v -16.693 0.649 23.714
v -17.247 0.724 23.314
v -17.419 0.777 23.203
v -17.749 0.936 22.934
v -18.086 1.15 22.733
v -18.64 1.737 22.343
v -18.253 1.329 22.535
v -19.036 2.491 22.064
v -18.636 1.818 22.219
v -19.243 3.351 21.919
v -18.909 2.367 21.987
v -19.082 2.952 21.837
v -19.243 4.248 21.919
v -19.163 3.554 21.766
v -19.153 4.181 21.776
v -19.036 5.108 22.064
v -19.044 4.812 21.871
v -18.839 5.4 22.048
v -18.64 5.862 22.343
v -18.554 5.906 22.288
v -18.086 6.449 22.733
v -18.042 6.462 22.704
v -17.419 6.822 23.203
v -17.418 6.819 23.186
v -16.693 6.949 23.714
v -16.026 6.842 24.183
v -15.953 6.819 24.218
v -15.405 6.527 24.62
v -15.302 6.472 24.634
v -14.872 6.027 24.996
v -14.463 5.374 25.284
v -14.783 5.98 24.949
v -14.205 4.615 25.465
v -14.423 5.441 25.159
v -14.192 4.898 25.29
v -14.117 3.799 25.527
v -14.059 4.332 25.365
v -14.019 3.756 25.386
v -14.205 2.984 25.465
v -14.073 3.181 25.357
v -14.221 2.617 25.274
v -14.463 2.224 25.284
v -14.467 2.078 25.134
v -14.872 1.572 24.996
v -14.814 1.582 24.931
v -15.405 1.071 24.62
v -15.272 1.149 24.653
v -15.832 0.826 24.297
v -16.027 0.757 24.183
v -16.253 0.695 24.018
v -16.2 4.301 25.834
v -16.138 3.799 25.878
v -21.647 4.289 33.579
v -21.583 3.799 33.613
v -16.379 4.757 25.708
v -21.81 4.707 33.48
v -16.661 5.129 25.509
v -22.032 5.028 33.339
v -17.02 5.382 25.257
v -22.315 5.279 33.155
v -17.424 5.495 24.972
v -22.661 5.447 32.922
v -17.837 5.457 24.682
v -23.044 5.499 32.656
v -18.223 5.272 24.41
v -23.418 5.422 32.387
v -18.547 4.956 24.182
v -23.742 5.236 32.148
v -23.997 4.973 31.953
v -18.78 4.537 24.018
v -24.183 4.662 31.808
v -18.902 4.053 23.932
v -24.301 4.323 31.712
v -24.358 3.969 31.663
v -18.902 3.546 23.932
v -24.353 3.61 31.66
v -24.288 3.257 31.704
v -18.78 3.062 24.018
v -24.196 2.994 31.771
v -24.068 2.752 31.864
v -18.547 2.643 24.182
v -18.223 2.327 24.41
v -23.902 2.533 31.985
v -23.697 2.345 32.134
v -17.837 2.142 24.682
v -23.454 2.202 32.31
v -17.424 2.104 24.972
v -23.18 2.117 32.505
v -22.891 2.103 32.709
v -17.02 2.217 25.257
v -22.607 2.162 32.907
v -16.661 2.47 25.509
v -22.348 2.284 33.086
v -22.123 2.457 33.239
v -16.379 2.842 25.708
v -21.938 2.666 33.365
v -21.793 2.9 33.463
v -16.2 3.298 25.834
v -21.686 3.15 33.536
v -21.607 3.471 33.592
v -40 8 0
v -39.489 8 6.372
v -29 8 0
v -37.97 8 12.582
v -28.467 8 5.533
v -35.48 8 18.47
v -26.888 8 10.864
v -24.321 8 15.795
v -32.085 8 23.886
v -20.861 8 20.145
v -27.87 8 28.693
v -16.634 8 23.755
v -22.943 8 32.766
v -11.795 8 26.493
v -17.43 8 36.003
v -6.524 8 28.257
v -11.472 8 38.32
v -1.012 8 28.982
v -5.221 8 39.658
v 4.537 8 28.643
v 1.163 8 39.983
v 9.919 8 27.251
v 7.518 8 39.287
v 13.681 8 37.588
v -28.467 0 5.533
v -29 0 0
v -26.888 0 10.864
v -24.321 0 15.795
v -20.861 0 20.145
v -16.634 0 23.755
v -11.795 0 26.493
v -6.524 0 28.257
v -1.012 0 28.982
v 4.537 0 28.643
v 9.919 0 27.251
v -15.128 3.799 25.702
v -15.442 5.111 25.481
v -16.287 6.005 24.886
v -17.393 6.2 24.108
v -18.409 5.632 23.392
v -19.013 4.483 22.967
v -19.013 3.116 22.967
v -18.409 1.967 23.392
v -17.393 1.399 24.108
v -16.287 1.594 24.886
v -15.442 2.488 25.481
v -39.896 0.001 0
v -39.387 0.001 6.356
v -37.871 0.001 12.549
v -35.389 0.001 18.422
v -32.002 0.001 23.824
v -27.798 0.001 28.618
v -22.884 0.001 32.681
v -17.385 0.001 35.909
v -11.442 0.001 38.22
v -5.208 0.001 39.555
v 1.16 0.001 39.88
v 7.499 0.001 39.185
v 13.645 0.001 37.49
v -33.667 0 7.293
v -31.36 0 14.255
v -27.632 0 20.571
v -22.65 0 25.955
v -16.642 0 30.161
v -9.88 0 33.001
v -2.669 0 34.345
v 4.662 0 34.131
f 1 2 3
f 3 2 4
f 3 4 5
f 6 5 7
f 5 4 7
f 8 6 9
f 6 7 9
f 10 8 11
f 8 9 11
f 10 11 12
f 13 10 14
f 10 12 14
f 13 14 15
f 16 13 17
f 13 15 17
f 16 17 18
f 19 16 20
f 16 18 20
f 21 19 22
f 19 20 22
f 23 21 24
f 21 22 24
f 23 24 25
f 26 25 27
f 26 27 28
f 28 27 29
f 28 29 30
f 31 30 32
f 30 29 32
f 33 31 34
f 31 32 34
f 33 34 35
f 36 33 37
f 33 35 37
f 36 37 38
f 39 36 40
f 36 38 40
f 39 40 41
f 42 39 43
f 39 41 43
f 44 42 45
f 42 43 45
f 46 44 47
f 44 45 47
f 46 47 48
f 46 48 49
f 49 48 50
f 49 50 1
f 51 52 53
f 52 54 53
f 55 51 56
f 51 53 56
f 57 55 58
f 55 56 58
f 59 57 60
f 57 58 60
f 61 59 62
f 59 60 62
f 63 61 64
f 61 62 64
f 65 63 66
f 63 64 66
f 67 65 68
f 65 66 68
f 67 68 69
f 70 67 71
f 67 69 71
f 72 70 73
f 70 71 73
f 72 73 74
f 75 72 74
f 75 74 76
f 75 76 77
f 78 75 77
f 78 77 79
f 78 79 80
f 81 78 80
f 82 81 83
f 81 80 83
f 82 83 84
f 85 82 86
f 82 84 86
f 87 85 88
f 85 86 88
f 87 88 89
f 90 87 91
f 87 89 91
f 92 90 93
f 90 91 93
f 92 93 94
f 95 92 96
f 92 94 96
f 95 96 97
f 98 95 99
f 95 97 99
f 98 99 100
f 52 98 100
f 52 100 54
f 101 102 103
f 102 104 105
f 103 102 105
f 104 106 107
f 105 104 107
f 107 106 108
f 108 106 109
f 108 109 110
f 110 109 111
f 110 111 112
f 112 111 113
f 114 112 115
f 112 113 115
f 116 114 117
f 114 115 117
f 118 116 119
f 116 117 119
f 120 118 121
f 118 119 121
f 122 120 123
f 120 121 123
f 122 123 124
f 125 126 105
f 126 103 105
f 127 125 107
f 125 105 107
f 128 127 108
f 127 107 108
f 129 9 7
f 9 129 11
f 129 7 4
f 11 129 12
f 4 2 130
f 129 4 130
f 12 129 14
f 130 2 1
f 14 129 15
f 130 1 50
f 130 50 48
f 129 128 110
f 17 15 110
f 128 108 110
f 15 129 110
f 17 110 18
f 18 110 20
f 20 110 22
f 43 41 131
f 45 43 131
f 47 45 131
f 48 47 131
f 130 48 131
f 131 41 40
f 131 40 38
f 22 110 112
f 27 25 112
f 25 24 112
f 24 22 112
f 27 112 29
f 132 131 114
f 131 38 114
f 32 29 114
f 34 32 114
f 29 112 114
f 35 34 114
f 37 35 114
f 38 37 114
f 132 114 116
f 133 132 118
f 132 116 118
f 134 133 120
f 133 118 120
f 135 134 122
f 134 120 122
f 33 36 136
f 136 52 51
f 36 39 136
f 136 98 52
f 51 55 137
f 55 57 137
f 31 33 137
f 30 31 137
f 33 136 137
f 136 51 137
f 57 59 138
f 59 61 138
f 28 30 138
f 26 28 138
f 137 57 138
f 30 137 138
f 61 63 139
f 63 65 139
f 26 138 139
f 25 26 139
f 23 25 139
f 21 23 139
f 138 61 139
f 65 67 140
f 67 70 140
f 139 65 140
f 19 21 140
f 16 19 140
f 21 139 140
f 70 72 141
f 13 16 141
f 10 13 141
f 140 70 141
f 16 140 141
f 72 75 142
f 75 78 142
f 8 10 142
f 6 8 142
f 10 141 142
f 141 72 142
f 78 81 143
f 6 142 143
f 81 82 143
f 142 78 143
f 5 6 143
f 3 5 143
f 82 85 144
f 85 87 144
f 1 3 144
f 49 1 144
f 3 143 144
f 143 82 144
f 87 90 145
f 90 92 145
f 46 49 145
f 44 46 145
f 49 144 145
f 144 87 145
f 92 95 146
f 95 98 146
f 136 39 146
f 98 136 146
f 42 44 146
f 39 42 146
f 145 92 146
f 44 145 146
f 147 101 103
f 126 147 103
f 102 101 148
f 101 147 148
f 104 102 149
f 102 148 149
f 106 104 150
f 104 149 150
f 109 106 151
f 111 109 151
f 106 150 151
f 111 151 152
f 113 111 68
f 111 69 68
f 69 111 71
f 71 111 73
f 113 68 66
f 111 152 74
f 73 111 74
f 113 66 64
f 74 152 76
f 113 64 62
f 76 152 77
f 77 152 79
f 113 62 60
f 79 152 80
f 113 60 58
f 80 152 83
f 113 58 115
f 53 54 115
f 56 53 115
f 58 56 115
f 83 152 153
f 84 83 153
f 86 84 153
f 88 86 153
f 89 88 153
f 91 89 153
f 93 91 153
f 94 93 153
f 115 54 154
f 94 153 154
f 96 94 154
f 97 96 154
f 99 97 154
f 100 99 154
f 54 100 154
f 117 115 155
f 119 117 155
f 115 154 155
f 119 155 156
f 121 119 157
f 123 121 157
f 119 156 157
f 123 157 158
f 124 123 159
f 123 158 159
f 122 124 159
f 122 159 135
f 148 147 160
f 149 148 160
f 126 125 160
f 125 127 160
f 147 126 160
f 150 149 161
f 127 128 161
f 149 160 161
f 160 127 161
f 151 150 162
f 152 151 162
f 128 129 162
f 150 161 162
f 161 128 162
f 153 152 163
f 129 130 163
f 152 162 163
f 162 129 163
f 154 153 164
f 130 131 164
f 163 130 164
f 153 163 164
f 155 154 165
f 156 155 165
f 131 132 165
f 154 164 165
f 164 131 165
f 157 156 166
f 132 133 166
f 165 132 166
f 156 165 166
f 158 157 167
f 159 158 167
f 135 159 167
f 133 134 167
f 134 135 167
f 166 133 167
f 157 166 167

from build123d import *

# Parameters (mm, degrees)
REVOLVE1_ANGLE                                      = 110
CSK_FOR_M3_COUNTERSUNK_FLAT_HEAD_SCREW1_D           = 3.4
CSK_FOR_M3_COUNTERSUNK_FLAT_HEAD_SCREW1_CSINK_D     = 6.3
CSK_FOR_M3_COUNTERSUNK_FLAT_HEAD_SCREW1_CSINK_ANGLE = 90


with BuildPart() as part:
    # Sketch1 → Revolve1 (revolve)
    with BuildSketch(Plane.XY):
        Polygon((-29, 0), (-29, 8), (-40, 8), (-39.896417966, 0.000670605), align=None)
    revolve(axis=Axis((0, 0, 0), (0, 1, 0)), revolution_arc=REVOLVE1_ANGLE)

    # CSK for M3 Countersunk Flat Head Screw1 (through all)
    with Locations(Plane(origin=(-16.693228701, 3.799474552, 23.713627212), x_dir=(-0.817711283, 0, -0.575628576), z_dir=(0.575628576, 0, -0.817711283))):
        with Locations((0, 0)):
            CounterSinkHole(CSK_FOR_M3_COUNTERSUNK_FLAT_HEAD_SCREW1_D / 2, CSK_FOR_M3_COUNTERSUNK_FLAT_HEAD_SCREW1_CSINK_D / 2, counter_sink_angle=CSK_FOR_M3_COUNTERSUNK_FLAT_HEAD_SCREW1_CSINK_ANGLE)


solid = part.part
